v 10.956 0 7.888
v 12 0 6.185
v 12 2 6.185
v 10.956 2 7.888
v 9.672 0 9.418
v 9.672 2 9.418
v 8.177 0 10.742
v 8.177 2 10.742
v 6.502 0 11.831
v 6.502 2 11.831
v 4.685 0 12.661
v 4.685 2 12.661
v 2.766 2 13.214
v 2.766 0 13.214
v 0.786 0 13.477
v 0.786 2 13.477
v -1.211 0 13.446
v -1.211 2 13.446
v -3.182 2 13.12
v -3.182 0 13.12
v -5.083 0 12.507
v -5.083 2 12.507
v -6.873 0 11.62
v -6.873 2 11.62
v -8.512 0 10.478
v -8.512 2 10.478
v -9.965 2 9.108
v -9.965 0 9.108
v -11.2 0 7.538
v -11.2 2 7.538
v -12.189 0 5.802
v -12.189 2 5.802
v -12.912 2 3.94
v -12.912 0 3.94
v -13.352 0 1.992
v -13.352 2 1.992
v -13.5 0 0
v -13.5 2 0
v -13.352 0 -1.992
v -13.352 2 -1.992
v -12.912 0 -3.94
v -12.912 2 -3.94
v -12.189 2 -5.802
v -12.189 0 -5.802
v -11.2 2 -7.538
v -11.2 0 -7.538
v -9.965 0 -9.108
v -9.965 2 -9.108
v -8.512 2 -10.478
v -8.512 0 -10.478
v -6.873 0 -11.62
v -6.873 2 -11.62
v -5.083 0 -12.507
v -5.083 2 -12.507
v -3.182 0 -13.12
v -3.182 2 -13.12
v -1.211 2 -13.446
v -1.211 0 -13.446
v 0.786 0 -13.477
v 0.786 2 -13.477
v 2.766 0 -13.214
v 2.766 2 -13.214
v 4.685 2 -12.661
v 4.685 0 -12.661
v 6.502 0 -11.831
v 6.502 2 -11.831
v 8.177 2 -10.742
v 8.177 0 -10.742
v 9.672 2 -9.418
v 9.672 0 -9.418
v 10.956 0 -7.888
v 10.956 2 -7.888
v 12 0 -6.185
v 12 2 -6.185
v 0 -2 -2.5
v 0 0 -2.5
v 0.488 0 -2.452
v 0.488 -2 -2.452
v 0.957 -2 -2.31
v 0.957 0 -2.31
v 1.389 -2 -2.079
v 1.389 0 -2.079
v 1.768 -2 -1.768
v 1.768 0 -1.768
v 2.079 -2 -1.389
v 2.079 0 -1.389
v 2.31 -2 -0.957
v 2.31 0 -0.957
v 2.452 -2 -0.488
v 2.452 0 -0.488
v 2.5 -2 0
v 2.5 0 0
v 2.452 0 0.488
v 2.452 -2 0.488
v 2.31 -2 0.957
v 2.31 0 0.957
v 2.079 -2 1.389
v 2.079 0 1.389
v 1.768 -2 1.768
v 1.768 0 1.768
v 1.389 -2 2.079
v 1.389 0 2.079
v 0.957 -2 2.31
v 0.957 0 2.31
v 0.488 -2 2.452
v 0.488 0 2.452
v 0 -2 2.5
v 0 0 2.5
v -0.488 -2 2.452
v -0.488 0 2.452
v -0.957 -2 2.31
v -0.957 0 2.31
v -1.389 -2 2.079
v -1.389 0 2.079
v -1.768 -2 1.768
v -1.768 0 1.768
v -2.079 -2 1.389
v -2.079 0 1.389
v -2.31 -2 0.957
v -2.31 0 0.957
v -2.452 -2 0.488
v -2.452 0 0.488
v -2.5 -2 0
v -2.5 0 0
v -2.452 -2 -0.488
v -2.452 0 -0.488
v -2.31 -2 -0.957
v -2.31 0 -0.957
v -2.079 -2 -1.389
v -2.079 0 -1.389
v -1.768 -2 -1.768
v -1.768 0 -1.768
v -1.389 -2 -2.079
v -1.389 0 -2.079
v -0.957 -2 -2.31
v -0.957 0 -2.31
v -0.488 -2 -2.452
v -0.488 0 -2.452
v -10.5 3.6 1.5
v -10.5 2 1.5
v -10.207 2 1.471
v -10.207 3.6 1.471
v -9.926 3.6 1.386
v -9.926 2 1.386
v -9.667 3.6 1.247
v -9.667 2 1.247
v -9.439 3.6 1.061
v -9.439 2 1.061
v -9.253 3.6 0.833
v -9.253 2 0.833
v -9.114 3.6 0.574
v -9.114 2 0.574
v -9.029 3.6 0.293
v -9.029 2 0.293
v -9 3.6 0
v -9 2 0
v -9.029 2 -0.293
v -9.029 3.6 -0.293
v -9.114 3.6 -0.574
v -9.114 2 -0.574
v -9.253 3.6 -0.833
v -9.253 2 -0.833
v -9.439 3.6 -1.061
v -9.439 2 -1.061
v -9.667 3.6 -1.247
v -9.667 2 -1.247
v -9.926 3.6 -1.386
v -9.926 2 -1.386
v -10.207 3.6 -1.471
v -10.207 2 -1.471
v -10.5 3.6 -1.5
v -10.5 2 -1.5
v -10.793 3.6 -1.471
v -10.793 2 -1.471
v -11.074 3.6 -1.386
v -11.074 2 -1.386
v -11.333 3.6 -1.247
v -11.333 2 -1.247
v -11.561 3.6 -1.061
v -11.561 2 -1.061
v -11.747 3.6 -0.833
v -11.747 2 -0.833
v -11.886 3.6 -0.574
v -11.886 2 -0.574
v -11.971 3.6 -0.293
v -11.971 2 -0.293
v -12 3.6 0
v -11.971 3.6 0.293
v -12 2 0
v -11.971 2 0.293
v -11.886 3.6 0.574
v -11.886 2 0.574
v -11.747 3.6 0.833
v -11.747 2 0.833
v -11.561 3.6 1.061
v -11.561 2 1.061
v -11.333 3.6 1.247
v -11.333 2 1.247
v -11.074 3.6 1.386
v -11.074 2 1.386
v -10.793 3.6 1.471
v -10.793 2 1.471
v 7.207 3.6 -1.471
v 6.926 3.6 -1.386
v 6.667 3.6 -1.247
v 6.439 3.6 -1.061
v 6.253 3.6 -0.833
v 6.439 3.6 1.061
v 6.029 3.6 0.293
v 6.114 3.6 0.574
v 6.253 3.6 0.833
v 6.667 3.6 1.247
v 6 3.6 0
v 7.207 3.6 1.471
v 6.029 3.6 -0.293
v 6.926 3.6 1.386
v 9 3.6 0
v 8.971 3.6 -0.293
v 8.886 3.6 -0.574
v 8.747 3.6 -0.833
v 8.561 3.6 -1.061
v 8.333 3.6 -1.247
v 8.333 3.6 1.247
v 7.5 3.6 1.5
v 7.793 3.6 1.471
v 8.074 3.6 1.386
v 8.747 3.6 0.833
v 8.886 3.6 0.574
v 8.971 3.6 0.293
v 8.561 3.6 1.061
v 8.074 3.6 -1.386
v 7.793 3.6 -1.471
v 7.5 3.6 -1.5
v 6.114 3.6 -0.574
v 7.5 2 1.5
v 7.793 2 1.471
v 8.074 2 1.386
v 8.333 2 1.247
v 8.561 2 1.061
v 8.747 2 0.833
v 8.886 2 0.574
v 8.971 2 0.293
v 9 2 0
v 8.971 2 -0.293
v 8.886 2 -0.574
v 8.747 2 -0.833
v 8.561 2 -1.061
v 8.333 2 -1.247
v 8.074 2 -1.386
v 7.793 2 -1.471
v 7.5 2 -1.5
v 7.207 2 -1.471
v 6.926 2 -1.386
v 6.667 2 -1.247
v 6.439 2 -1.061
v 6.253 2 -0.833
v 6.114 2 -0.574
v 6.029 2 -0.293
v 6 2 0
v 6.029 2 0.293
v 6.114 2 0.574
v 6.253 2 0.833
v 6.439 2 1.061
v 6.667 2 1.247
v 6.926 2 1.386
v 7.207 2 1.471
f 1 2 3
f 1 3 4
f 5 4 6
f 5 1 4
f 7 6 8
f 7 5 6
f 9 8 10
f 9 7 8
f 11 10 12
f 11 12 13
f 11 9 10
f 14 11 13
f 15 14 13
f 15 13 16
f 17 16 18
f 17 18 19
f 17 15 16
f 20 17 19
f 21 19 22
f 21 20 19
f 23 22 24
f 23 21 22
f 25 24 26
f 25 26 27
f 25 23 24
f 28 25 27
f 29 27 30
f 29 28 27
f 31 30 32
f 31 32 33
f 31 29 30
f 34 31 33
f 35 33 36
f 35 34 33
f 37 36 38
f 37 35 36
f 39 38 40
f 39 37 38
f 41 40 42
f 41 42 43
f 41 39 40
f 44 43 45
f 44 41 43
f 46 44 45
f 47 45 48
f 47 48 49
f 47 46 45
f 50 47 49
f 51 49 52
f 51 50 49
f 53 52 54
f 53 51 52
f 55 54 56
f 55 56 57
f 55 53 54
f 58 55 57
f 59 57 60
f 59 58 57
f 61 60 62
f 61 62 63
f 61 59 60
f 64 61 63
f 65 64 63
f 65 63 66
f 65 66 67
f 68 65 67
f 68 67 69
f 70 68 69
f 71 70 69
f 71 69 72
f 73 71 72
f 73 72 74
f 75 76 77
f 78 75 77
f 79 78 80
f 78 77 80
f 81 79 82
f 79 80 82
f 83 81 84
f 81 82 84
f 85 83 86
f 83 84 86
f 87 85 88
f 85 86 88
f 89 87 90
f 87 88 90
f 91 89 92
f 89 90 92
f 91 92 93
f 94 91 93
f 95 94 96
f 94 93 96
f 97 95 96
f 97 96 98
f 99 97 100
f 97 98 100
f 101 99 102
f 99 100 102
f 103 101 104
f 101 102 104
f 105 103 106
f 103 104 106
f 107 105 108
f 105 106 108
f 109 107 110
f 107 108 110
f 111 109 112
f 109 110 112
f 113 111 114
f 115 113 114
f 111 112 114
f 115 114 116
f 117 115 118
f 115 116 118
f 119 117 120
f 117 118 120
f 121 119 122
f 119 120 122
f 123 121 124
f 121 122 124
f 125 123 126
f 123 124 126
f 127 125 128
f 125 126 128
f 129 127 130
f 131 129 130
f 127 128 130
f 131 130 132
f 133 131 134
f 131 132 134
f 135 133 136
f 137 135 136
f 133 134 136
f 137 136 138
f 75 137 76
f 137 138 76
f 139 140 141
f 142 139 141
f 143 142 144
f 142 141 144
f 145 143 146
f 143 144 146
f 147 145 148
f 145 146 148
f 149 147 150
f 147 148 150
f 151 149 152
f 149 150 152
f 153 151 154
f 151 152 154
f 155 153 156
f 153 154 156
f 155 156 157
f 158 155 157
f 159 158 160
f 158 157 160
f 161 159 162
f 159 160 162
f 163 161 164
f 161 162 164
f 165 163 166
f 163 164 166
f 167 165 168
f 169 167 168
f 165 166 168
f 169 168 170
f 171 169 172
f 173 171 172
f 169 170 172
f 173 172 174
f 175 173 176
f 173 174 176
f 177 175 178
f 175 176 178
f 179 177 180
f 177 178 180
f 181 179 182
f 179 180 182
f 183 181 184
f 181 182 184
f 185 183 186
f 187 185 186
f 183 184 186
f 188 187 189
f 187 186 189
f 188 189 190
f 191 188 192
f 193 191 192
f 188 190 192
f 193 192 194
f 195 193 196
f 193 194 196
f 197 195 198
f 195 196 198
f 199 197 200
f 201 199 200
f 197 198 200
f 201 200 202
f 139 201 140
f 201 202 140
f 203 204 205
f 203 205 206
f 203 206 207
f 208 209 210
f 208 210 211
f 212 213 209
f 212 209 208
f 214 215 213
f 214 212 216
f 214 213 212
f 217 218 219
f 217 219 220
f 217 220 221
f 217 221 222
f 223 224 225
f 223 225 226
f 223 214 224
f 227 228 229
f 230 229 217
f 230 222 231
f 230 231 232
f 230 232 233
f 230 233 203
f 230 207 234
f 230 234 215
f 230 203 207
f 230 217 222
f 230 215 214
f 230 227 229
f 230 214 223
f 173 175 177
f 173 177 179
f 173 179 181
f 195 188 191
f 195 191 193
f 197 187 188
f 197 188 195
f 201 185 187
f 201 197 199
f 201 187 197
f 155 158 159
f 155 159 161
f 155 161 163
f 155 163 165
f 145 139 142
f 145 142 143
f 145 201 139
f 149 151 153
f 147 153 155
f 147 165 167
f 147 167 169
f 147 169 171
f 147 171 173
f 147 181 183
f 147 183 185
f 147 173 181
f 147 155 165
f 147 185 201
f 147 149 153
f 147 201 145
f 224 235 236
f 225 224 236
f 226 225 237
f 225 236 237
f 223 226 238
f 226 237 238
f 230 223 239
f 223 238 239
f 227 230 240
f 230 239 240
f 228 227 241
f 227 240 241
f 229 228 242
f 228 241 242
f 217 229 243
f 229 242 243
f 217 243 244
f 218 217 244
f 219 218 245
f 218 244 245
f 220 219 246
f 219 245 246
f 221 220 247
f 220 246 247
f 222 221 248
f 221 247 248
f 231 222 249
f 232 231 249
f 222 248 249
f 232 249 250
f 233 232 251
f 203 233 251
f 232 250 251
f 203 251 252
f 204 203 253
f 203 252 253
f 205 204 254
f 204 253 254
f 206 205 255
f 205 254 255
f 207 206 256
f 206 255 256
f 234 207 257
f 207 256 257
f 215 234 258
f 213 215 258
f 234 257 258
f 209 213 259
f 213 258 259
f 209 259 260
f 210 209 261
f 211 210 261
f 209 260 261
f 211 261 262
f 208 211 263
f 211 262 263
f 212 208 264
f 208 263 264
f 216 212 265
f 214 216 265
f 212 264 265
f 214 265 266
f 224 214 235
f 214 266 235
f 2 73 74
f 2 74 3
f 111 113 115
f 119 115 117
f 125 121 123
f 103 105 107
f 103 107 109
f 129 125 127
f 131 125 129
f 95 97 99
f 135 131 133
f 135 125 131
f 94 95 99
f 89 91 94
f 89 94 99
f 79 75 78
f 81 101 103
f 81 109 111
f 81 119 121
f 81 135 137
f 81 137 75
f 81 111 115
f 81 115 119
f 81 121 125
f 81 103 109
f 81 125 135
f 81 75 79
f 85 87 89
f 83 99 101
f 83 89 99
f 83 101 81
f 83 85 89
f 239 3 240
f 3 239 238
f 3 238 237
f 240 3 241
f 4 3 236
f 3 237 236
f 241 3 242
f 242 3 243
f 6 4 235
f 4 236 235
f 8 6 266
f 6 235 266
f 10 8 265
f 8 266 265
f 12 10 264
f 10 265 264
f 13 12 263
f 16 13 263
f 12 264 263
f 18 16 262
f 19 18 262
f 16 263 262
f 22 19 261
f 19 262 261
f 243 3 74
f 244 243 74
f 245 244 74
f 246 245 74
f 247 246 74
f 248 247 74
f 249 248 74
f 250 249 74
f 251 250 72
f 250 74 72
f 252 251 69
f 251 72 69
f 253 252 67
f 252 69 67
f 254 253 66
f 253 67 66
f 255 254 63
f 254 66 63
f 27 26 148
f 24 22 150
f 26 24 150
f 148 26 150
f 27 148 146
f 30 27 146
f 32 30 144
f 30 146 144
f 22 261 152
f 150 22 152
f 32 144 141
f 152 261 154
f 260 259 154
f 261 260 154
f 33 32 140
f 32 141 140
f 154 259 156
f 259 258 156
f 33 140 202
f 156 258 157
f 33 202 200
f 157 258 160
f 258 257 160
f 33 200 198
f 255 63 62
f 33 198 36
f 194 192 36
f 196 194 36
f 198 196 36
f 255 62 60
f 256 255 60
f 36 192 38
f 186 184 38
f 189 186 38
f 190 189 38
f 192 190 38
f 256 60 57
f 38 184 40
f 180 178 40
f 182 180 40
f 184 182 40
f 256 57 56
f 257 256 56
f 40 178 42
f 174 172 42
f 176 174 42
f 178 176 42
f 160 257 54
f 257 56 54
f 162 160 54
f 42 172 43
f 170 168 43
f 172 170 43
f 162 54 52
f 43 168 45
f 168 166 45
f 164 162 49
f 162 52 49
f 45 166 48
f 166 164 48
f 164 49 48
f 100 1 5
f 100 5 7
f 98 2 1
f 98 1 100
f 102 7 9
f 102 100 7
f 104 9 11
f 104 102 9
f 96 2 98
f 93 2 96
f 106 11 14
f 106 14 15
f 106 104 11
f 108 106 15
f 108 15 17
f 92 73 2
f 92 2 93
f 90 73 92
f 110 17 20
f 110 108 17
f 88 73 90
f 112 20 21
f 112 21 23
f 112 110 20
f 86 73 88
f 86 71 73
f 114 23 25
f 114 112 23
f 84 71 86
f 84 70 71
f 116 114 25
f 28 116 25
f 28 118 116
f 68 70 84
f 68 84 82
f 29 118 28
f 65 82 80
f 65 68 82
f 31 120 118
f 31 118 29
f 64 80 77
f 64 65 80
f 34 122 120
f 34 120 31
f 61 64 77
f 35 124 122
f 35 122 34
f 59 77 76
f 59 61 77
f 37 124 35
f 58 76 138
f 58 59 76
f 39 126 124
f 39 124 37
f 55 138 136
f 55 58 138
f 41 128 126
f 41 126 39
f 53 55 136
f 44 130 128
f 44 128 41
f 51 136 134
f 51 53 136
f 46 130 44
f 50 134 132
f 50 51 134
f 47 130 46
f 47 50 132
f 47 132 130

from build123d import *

# Parameters (mm, degrees)
SALIENTE_EXTRUIR1_DEPTH = 2
CROQUIS3_R              = 1.5
SALIENTE_EXTRUIR2_DEPTH = 1.6
CROQUIS4_R              = 2.5
SALIENTE_EXTRUIR3_DEPTH = 2


with BuildPart() as part:
    # Croquis2 → Saliente-Extruir1 (new body)
    with BuildSketch(Plane(origin=(0, 0, 0), x_dir=(1, 0, 0), z_dir=(0, 1, 0))):
        with BuildLine():
            Line((12, 6.184658438), (12, -6.184658438))
            ThreePointArc((12, -6.184658438), (-13.5, 0), (12, 6.184658438))
        make_face()
    extrude(amount=SALIENTE_EXTRUIR1_DEPTH)

    # Croquis3 → Saliente-Extruir2 (add)
    with BuildSketch(Plane(origin=(0, 2, 0), x_dir=(1, 0, 0), z_dir=(0, 1, 0))):
        with Locations(Location((-10.5, 0, 0), (0, 0, 270))):
            Circle(CROQUIS3_R)
        with Locations(Location((7.5, 0, 0), (0, 0, 270))):
            Circle(CROQUIS3_R)
    extrude(amount=SALIENTE_EXTRUIR2_DEPTH)

    # Croquis4 → Saliente-Extruir3 (add)
    with BuildSketch(Plane.XZ):
        with Locations(Location((0, 0, 0), (0, 0, 270))):
            Circle(CROQUIS4_R)
    extrude(amount=SALIENTE_EXTRUIR3_DEPTH)


solid = part.part
